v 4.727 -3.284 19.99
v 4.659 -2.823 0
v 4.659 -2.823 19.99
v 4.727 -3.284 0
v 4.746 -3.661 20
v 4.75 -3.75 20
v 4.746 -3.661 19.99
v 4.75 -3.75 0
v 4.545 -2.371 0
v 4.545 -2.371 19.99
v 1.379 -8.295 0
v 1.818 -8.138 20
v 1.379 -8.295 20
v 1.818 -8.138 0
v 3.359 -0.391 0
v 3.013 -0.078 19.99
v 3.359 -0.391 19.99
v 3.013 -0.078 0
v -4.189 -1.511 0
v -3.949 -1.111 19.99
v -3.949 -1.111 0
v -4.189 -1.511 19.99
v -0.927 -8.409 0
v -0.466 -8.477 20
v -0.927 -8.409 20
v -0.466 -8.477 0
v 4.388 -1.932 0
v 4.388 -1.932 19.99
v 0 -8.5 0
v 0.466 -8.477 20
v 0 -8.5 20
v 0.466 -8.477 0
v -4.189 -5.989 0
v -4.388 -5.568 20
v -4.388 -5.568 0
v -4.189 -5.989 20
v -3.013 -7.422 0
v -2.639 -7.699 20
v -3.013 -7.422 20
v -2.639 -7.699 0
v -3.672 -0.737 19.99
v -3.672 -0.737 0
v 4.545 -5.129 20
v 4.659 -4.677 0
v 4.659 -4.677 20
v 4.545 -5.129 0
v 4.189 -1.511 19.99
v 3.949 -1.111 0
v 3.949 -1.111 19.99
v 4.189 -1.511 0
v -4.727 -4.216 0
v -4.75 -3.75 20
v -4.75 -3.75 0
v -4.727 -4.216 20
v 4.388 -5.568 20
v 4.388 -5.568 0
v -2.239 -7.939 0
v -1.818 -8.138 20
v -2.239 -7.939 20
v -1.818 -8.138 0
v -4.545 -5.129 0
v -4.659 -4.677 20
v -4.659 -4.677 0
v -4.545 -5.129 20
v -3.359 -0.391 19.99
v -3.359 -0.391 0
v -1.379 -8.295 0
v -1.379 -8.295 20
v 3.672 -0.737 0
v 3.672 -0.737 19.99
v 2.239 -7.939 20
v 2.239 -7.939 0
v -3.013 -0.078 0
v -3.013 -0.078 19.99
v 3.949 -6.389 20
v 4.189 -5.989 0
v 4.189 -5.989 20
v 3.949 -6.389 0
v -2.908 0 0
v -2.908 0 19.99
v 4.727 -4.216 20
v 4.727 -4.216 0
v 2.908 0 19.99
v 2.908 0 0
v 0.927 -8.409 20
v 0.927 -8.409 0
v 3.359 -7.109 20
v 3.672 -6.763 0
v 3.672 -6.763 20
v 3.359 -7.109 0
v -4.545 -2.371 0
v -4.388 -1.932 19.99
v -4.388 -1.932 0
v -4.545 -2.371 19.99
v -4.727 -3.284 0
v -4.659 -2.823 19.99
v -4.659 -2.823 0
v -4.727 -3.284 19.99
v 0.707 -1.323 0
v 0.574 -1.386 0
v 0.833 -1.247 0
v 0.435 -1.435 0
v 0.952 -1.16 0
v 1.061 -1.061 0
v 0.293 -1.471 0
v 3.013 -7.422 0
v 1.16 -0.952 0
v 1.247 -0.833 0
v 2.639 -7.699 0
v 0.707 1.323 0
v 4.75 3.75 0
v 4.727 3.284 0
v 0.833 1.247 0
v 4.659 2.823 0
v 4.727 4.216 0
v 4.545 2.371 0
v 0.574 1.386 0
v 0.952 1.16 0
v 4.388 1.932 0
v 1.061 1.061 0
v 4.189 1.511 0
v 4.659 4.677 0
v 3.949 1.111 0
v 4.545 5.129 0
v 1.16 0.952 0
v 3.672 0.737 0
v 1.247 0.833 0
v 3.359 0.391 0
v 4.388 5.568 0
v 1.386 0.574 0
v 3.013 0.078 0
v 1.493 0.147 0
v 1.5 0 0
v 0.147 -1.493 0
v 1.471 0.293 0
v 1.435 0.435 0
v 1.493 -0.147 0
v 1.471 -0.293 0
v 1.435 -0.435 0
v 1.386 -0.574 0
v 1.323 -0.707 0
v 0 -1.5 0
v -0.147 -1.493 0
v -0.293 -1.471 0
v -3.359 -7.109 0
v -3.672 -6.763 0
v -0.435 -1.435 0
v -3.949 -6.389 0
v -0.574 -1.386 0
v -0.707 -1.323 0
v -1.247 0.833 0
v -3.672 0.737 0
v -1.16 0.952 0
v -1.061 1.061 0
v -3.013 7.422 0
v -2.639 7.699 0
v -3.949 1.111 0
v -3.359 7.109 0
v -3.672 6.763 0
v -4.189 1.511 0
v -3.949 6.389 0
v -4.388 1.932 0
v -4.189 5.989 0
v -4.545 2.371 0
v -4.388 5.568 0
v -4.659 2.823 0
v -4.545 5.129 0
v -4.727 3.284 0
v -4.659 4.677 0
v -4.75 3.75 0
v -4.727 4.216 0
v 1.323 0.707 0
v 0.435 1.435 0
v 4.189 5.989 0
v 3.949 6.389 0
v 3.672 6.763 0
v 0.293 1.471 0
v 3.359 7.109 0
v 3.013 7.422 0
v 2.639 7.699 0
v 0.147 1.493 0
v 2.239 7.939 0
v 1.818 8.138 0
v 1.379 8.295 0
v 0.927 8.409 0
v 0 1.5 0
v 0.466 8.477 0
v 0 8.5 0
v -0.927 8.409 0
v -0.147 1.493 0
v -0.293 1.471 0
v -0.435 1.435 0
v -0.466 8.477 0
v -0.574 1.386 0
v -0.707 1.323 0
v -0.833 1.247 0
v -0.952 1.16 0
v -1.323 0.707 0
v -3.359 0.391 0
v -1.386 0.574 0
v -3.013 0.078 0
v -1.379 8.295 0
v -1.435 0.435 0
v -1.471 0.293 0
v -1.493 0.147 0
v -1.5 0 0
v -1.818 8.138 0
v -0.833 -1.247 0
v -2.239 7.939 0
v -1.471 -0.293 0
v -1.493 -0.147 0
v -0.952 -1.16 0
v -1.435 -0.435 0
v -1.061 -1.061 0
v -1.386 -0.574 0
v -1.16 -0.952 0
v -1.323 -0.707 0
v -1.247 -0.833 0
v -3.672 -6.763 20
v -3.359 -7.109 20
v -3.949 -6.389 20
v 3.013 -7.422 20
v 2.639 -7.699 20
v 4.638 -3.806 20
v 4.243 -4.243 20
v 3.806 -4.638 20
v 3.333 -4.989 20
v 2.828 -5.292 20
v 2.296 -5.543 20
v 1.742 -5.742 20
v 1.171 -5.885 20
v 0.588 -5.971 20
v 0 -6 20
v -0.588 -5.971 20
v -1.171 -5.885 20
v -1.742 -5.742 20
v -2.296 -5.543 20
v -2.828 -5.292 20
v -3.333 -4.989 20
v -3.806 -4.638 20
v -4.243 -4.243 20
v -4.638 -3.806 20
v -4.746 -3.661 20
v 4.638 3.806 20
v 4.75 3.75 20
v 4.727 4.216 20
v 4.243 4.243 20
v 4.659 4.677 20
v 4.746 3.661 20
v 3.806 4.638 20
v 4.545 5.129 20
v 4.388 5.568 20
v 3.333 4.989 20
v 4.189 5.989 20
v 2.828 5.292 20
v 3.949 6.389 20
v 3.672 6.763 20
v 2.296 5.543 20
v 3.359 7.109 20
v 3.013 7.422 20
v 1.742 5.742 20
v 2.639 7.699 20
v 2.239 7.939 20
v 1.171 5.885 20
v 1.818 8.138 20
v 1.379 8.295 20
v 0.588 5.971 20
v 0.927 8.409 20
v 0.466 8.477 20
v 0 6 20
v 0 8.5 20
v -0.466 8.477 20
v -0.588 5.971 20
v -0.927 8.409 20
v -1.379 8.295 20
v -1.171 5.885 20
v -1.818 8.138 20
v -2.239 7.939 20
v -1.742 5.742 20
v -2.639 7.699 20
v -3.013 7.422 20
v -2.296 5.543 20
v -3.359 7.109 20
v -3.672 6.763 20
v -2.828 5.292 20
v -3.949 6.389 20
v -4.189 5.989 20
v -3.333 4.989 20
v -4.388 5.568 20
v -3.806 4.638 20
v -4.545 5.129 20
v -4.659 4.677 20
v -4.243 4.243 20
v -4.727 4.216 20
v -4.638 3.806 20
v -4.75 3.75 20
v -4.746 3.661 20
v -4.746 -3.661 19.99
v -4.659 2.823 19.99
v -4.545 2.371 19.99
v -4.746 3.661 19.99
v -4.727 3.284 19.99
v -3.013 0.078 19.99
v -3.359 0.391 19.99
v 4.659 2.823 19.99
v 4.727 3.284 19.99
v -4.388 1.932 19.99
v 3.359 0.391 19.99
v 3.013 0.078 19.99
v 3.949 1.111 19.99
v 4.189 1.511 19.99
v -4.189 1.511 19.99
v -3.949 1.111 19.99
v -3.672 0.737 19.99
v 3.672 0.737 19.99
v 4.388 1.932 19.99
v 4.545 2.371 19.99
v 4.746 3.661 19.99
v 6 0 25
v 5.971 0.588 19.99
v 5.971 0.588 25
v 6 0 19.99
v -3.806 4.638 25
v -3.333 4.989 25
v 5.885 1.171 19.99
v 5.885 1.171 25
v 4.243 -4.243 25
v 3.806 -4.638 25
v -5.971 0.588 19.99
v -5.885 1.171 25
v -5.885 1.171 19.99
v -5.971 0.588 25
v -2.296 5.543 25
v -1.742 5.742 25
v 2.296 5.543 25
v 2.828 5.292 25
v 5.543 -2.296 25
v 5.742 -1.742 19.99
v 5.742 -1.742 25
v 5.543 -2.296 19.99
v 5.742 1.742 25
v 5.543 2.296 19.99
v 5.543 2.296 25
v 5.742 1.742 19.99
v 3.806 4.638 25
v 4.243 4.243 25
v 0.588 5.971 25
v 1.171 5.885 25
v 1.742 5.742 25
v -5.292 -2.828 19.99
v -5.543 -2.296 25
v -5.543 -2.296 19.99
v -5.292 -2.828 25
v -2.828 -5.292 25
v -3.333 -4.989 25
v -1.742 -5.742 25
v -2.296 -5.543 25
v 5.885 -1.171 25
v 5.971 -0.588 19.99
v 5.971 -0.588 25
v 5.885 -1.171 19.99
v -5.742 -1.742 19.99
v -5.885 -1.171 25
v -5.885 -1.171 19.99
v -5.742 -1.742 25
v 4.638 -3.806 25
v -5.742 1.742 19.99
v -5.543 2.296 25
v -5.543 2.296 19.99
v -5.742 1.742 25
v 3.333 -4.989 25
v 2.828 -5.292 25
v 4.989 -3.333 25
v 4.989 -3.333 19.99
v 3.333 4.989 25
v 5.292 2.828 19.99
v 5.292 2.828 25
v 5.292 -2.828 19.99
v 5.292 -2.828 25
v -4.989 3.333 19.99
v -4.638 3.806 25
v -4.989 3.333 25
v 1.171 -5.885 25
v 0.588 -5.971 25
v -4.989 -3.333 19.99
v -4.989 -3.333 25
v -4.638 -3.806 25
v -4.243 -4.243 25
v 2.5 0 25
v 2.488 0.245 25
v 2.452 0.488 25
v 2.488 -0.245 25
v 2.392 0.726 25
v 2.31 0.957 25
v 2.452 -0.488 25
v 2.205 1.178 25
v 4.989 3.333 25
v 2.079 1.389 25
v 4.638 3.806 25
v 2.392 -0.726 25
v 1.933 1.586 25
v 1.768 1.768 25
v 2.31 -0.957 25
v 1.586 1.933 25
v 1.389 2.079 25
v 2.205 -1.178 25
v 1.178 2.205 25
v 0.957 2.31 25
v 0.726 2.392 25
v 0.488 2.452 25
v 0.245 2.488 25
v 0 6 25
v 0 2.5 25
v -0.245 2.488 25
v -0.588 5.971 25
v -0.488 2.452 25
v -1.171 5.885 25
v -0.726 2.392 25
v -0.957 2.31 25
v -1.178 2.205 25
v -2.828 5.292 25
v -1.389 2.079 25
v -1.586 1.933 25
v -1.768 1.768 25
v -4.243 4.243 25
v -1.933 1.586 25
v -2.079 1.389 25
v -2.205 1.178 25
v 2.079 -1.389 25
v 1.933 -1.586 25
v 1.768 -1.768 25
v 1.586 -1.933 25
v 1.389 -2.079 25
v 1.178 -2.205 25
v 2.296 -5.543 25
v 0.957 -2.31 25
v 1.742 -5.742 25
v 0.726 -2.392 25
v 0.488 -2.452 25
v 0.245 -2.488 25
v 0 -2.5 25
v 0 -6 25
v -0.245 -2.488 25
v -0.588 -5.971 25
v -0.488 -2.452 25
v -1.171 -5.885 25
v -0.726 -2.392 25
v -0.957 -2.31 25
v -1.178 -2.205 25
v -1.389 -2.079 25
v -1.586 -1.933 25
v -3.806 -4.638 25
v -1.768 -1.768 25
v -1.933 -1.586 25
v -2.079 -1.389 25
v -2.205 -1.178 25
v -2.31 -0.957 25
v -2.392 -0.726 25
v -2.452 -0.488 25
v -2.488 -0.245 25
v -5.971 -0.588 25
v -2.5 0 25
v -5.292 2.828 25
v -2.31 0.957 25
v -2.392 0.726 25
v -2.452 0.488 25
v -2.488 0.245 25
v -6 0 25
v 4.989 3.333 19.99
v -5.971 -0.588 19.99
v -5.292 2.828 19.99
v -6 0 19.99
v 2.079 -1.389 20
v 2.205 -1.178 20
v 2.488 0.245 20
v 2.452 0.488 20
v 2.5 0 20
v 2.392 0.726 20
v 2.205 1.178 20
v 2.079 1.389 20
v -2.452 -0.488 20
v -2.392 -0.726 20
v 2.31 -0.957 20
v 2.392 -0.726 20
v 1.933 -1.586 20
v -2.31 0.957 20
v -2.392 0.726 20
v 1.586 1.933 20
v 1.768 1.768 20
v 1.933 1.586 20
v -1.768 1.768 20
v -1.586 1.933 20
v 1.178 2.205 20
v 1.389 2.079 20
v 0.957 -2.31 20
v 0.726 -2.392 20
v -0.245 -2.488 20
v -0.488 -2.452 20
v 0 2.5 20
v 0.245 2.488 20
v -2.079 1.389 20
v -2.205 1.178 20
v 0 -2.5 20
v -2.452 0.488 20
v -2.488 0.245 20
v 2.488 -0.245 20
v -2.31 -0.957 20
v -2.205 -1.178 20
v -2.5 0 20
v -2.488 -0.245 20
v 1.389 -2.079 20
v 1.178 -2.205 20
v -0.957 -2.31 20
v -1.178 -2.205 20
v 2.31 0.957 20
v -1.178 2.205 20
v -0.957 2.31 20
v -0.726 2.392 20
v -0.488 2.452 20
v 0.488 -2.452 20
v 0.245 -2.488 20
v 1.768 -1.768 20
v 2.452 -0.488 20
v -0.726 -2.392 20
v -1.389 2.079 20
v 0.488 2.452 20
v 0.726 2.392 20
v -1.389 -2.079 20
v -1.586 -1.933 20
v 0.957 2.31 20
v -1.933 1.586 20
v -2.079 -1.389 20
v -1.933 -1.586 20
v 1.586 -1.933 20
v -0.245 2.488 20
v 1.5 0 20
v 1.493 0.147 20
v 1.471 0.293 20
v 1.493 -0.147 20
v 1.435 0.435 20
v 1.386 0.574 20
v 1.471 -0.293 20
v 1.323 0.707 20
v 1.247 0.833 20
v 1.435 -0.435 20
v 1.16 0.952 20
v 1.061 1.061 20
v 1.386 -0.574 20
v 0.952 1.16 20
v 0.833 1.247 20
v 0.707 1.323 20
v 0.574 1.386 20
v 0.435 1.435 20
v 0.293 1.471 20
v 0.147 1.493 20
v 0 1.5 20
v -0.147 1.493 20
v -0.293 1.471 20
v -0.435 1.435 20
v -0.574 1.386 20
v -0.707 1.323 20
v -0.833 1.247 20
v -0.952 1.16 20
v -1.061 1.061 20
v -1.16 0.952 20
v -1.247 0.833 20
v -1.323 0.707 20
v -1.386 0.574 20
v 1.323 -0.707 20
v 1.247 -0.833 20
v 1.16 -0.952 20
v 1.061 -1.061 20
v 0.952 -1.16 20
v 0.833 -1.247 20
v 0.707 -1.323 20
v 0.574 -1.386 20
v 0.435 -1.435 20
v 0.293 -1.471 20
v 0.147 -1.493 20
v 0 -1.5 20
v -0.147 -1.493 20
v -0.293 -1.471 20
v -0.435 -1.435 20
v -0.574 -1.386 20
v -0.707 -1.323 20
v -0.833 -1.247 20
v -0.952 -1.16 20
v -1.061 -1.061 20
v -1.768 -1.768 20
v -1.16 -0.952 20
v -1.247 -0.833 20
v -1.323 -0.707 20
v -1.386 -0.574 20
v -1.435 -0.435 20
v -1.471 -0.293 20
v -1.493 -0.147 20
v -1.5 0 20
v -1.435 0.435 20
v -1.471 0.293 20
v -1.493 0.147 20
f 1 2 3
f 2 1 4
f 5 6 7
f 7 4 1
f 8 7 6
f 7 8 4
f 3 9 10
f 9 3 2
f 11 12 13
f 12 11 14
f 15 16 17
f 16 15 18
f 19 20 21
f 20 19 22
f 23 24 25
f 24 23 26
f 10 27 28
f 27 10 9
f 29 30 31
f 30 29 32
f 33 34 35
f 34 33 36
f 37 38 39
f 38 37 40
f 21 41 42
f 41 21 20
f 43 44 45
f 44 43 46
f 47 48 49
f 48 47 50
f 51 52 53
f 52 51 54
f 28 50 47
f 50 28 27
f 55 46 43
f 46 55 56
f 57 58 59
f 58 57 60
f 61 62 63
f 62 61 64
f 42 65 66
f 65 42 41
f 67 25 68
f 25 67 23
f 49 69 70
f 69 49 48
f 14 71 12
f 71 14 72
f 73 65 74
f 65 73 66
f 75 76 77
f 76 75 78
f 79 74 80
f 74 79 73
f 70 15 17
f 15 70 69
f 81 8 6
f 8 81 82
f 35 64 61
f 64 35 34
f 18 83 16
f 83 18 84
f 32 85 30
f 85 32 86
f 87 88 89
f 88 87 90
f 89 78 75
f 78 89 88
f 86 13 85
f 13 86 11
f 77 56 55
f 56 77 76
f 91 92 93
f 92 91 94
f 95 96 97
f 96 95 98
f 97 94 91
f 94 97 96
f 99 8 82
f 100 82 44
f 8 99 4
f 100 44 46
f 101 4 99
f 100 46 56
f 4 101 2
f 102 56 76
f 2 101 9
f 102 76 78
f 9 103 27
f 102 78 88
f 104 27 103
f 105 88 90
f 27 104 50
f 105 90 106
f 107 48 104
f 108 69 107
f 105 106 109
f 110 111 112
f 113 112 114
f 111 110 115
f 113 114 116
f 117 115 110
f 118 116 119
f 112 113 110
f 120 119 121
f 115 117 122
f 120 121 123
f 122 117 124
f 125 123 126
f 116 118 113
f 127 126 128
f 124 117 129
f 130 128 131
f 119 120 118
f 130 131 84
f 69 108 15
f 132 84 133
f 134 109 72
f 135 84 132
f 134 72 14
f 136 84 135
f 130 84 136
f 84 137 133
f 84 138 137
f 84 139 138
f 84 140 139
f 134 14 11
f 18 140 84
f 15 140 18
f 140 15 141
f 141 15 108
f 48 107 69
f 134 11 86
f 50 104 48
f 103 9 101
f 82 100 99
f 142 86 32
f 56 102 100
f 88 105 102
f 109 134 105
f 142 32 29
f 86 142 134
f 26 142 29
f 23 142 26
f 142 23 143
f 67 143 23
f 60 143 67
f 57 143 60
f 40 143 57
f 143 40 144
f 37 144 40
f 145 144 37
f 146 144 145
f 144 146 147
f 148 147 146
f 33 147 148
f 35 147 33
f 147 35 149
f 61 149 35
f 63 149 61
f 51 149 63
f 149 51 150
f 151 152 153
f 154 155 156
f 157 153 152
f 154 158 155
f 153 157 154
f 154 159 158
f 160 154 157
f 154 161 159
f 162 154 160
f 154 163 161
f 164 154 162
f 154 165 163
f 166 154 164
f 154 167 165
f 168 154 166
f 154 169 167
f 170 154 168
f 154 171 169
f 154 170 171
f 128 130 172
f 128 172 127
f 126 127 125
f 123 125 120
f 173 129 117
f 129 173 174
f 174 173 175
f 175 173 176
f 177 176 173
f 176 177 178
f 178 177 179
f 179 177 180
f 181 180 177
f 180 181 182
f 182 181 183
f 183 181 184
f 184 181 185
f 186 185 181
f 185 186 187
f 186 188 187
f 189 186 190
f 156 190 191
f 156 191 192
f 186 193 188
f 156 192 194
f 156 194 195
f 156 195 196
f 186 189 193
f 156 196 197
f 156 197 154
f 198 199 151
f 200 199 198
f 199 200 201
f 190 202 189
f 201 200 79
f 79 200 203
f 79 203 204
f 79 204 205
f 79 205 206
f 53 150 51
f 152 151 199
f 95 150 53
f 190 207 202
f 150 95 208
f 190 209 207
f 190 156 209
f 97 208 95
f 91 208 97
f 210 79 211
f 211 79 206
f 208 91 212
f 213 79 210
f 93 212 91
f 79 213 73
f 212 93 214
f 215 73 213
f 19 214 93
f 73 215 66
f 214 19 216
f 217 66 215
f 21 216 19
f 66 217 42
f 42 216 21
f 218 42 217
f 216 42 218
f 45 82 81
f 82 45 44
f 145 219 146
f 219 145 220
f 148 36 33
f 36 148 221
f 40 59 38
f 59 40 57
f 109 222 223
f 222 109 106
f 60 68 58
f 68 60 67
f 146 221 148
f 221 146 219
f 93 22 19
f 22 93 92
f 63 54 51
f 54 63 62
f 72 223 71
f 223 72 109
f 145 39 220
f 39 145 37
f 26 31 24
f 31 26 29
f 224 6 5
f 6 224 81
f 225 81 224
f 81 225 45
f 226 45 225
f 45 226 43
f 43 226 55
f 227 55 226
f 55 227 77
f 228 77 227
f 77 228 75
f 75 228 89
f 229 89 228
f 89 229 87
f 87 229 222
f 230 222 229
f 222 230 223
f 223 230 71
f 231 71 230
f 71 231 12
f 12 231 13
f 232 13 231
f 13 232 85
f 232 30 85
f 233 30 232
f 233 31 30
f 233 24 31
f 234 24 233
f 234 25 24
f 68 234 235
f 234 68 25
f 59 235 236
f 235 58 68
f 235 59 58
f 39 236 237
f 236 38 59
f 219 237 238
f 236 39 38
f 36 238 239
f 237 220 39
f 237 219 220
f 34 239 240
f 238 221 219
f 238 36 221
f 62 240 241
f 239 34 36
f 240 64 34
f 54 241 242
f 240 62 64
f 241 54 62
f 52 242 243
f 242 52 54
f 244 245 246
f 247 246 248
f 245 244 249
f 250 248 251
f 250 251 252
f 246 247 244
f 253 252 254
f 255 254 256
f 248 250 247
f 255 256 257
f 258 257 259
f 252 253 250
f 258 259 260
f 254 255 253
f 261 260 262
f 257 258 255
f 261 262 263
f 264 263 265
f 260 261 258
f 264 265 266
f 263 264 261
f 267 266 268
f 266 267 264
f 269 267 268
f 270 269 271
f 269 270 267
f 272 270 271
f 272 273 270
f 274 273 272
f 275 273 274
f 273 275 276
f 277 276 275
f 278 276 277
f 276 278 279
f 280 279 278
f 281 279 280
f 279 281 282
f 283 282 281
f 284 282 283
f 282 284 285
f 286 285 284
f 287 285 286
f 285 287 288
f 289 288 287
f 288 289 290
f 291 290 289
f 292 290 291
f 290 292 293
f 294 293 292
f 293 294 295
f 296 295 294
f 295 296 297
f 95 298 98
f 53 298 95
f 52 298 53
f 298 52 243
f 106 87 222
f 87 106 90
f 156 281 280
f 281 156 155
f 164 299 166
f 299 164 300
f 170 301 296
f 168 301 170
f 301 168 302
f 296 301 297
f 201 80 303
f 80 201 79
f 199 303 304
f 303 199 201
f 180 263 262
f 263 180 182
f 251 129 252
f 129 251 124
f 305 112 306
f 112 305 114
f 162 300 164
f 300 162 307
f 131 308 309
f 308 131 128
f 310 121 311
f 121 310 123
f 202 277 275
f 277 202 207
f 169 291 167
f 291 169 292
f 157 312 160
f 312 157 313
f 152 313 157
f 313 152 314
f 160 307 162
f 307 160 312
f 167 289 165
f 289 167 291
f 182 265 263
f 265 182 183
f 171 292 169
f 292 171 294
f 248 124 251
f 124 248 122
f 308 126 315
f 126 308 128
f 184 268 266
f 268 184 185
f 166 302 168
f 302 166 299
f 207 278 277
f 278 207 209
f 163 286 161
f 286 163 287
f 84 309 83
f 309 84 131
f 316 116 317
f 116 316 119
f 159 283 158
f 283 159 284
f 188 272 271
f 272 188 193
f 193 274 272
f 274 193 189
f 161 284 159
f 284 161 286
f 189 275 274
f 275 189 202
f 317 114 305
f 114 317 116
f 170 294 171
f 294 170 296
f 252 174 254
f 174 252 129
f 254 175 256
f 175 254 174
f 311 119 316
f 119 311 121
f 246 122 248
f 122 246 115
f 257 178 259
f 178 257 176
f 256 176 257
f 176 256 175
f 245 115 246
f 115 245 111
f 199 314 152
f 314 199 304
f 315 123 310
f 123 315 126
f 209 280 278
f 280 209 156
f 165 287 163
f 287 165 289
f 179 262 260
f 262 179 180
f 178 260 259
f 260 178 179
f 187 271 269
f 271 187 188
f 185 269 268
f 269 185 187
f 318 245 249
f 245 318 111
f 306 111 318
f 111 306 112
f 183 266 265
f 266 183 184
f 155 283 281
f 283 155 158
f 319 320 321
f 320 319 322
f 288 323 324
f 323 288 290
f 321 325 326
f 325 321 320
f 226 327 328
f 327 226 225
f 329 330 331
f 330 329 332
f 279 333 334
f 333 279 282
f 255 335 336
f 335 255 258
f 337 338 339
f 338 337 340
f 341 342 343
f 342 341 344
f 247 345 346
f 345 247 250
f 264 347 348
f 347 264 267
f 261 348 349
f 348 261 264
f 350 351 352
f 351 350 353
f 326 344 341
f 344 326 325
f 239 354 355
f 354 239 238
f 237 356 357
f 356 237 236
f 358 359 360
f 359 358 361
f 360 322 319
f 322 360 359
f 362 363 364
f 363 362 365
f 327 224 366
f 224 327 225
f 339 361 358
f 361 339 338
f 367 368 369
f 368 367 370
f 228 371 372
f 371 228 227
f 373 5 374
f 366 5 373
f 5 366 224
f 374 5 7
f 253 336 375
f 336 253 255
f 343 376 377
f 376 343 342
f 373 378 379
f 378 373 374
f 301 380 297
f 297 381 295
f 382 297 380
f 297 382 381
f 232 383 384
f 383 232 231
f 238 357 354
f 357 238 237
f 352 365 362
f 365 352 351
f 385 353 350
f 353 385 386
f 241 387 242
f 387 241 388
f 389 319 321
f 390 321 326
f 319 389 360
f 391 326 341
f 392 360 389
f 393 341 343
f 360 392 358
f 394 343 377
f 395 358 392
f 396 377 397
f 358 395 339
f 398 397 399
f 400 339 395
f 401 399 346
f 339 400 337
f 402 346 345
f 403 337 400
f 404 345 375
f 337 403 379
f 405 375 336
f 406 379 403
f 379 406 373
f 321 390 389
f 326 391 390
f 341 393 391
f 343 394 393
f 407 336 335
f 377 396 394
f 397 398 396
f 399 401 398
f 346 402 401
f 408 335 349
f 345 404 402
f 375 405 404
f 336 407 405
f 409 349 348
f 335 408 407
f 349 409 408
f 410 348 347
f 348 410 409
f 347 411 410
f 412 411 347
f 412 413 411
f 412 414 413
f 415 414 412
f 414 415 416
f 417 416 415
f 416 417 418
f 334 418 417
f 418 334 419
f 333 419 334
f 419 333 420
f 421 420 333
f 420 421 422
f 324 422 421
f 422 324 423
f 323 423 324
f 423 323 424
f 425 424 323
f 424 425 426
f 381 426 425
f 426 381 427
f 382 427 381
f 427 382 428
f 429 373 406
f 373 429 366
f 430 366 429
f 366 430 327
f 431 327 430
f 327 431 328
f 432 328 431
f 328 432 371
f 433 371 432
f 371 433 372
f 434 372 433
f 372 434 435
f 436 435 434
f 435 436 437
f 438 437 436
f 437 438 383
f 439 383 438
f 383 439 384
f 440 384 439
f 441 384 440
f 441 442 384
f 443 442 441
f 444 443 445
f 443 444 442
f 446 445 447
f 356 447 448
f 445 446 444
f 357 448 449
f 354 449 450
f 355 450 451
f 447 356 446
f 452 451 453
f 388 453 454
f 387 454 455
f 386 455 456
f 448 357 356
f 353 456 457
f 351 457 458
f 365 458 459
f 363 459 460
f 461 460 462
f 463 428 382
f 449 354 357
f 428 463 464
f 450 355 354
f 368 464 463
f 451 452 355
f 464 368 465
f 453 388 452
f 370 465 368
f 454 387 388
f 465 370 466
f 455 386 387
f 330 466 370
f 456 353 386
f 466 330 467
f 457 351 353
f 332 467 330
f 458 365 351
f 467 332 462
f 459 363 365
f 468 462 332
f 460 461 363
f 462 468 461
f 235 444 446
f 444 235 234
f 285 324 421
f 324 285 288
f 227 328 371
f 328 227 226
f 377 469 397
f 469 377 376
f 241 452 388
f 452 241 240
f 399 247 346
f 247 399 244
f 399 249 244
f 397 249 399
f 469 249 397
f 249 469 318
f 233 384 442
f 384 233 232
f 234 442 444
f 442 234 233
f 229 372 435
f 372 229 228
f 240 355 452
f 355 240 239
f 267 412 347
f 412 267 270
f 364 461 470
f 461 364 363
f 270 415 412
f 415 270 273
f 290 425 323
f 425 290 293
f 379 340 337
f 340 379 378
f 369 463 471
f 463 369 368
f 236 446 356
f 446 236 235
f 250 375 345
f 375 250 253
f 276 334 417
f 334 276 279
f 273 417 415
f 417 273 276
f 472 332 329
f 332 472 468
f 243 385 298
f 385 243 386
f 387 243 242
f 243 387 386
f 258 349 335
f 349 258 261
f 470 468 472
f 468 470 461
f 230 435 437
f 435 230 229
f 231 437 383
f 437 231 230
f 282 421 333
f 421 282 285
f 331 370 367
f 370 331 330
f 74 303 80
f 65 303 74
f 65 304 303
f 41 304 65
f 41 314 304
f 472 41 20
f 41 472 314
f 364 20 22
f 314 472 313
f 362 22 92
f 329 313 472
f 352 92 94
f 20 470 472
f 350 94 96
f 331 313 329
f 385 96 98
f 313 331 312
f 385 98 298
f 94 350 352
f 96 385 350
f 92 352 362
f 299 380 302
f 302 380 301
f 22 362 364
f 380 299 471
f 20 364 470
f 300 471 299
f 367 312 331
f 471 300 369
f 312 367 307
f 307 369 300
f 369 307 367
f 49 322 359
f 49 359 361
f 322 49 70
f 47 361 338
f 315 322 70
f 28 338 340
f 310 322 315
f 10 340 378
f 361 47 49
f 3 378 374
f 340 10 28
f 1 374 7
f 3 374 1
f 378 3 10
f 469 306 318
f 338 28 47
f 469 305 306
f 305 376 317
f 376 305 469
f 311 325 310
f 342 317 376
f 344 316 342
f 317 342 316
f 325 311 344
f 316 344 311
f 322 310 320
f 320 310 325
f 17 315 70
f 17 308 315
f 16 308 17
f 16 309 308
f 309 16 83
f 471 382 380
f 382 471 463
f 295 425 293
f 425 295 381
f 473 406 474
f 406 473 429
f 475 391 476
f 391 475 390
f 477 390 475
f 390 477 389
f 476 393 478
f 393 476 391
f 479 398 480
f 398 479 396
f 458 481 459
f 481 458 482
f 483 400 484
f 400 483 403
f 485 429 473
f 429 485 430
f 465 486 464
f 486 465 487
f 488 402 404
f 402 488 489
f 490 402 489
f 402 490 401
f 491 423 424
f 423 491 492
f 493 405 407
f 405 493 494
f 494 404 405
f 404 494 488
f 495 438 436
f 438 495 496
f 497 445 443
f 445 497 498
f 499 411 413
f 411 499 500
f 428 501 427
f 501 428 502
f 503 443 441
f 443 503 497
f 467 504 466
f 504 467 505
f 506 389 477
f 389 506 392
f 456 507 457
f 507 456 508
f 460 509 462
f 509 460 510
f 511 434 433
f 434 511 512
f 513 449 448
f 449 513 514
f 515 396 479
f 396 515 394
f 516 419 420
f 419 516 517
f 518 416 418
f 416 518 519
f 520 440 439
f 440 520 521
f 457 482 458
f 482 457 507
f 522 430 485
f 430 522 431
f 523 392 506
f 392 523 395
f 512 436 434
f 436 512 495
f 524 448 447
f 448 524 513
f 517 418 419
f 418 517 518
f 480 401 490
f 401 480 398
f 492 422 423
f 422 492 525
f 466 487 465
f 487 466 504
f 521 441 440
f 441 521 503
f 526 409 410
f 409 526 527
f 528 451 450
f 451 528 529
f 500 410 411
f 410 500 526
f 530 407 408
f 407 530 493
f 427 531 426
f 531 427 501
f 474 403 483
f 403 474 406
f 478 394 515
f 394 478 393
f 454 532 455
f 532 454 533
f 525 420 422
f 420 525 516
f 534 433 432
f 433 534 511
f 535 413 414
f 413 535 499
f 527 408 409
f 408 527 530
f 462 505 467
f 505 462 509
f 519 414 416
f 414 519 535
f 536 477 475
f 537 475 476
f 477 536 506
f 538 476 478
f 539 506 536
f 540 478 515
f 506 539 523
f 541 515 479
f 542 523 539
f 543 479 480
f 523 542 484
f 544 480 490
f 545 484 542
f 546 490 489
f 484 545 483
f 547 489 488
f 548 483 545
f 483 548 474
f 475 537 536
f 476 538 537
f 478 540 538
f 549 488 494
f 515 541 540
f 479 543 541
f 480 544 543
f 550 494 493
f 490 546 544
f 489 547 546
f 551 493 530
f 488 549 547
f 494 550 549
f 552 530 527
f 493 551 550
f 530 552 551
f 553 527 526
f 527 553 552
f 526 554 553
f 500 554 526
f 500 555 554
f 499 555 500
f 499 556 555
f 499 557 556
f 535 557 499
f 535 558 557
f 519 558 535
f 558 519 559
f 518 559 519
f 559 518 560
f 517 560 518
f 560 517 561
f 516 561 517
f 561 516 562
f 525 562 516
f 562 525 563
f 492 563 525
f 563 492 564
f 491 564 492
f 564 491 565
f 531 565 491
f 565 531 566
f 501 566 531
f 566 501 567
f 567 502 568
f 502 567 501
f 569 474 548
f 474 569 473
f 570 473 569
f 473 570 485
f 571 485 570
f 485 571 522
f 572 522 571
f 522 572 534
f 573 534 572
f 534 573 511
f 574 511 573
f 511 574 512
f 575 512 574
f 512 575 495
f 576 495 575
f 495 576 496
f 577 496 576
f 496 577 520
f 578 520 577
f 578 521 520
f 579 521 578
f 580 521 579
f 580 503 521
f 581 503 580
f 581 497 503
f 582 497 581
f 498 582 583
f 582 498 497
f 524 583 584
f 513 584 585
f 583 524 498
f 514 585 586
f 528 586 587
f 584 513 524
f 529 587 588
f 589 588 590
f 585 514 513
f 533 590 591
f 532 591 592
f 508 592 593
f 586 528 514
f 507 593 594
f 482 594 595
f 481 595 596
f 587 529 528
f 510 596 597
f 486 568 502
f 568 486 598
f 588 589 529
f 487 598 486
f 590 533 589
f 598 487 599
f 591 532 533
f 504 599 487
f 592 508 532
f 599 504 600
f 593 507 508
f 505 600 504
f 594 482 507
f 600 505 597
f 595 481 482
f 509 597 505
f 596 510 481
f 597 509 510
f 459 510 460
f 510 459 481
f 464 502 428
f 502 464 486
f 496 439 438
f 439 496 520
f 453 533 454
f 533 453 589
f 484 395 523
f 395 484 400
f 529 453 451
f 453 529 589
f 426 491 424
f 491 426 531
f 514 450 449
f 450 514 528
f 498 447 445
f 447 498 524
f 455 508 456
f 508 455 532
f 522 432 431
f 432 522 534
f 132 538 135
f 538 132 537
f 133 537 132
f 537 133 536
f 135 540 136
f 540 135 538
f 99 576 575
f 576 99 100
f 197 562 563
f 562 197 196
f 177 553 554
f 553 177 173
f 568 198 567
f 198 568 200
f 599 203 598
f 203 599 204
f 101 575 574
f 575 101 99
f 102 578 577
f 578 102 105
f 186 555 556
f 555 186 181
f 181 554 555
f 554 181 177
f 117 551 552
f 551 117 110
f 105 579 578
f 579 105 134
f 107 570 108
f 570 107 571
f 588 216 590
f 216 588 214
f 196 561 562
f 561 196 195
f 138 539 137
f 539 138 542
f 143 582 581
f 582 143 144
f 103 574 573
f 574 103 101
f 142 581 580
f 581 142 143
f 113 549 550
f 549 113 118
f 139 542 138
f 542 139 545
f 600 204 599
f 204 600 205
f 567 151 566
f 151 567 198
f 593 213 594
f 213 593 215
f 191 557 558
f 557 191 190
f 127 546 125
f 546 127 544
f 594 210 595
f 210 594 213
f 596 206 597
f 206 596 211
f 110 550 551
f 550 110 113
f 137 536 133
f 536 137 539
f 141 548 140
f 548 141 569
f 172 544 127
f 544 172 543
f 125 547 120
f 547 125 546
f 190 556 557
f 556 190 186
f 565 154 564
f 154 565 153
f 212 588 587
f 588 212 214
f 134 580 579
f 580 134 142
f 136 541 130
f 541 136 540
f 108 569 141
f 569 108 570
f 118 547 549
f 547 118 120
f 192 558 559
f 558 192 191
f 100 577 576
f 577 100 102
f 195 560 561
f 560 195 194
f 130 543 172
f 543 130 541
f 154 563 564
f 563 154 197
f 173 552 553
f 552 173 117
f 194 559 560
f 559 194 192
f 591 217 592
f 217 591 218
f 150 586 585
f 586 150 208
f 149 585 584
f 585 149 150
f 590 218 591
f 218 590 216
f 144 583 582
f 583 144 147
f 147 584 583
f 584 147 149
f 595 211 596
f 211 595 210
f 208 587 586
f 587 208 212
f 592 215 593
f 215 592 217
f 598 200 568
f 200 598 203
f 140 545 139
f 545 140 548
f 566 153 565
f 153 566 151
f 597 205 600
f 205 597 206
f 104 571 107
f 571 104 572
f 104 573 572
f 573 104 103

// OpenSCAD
// Hose-barb reducer: 8 mm OD tubing (split into two barbs) to 5 mm OD tubing
// Print orientation: standing upright along Z

$fn = 64;

// ---- Dimensions (mm) ----
tube8_od      = 9.5;   // outer diameter of 8 mm tubing (split)
tube8_inner   = 7.5;   // inner diameter of 8 mm tubing (split)
tube5_od      = 5.0;   // outer diameter of 5 mm tubing
tube5_inner   = 3.0;   // inner diameter of 5 mm tubing
bore          = 3;     // through-bore diameter
collar_od     = 12;    // collar outer diameter
collar_id     = 9.5;   // collar inner diameter (overlap into 8 mm section)
collar_h      = 5;     // collar height

section8_h    = 20;    // height of 8 mm tubing section
section5_h    = 15;    // height of 5 mm tubing section
eps           = 0.5;   // cutter overshoot

// ---- Model ----
difference() {
    union() {
        // 8 mm tubing section with two stacked barbs
        for (a = [0, 180])
            rotate([0, 0, a])
                translate([0, -tube8_inner/2, 0])
                    cylinder(h = section8_h, d = tube8_od);

        // Collar
        translate([0, 0, section8_h - 0.01])
            cylinder(h = collar_h + 0.01, d = collar_od);
    }

    // 5 mm tubing section
    translate([0, 0, section8_h])
        cylinder(h = section5_h, d = tube5_od);

    // Through-bore
    translate([0, 0, -eps])
        cylinder(h = section8_h + section5_h + 2*eps, d = bore);
}
